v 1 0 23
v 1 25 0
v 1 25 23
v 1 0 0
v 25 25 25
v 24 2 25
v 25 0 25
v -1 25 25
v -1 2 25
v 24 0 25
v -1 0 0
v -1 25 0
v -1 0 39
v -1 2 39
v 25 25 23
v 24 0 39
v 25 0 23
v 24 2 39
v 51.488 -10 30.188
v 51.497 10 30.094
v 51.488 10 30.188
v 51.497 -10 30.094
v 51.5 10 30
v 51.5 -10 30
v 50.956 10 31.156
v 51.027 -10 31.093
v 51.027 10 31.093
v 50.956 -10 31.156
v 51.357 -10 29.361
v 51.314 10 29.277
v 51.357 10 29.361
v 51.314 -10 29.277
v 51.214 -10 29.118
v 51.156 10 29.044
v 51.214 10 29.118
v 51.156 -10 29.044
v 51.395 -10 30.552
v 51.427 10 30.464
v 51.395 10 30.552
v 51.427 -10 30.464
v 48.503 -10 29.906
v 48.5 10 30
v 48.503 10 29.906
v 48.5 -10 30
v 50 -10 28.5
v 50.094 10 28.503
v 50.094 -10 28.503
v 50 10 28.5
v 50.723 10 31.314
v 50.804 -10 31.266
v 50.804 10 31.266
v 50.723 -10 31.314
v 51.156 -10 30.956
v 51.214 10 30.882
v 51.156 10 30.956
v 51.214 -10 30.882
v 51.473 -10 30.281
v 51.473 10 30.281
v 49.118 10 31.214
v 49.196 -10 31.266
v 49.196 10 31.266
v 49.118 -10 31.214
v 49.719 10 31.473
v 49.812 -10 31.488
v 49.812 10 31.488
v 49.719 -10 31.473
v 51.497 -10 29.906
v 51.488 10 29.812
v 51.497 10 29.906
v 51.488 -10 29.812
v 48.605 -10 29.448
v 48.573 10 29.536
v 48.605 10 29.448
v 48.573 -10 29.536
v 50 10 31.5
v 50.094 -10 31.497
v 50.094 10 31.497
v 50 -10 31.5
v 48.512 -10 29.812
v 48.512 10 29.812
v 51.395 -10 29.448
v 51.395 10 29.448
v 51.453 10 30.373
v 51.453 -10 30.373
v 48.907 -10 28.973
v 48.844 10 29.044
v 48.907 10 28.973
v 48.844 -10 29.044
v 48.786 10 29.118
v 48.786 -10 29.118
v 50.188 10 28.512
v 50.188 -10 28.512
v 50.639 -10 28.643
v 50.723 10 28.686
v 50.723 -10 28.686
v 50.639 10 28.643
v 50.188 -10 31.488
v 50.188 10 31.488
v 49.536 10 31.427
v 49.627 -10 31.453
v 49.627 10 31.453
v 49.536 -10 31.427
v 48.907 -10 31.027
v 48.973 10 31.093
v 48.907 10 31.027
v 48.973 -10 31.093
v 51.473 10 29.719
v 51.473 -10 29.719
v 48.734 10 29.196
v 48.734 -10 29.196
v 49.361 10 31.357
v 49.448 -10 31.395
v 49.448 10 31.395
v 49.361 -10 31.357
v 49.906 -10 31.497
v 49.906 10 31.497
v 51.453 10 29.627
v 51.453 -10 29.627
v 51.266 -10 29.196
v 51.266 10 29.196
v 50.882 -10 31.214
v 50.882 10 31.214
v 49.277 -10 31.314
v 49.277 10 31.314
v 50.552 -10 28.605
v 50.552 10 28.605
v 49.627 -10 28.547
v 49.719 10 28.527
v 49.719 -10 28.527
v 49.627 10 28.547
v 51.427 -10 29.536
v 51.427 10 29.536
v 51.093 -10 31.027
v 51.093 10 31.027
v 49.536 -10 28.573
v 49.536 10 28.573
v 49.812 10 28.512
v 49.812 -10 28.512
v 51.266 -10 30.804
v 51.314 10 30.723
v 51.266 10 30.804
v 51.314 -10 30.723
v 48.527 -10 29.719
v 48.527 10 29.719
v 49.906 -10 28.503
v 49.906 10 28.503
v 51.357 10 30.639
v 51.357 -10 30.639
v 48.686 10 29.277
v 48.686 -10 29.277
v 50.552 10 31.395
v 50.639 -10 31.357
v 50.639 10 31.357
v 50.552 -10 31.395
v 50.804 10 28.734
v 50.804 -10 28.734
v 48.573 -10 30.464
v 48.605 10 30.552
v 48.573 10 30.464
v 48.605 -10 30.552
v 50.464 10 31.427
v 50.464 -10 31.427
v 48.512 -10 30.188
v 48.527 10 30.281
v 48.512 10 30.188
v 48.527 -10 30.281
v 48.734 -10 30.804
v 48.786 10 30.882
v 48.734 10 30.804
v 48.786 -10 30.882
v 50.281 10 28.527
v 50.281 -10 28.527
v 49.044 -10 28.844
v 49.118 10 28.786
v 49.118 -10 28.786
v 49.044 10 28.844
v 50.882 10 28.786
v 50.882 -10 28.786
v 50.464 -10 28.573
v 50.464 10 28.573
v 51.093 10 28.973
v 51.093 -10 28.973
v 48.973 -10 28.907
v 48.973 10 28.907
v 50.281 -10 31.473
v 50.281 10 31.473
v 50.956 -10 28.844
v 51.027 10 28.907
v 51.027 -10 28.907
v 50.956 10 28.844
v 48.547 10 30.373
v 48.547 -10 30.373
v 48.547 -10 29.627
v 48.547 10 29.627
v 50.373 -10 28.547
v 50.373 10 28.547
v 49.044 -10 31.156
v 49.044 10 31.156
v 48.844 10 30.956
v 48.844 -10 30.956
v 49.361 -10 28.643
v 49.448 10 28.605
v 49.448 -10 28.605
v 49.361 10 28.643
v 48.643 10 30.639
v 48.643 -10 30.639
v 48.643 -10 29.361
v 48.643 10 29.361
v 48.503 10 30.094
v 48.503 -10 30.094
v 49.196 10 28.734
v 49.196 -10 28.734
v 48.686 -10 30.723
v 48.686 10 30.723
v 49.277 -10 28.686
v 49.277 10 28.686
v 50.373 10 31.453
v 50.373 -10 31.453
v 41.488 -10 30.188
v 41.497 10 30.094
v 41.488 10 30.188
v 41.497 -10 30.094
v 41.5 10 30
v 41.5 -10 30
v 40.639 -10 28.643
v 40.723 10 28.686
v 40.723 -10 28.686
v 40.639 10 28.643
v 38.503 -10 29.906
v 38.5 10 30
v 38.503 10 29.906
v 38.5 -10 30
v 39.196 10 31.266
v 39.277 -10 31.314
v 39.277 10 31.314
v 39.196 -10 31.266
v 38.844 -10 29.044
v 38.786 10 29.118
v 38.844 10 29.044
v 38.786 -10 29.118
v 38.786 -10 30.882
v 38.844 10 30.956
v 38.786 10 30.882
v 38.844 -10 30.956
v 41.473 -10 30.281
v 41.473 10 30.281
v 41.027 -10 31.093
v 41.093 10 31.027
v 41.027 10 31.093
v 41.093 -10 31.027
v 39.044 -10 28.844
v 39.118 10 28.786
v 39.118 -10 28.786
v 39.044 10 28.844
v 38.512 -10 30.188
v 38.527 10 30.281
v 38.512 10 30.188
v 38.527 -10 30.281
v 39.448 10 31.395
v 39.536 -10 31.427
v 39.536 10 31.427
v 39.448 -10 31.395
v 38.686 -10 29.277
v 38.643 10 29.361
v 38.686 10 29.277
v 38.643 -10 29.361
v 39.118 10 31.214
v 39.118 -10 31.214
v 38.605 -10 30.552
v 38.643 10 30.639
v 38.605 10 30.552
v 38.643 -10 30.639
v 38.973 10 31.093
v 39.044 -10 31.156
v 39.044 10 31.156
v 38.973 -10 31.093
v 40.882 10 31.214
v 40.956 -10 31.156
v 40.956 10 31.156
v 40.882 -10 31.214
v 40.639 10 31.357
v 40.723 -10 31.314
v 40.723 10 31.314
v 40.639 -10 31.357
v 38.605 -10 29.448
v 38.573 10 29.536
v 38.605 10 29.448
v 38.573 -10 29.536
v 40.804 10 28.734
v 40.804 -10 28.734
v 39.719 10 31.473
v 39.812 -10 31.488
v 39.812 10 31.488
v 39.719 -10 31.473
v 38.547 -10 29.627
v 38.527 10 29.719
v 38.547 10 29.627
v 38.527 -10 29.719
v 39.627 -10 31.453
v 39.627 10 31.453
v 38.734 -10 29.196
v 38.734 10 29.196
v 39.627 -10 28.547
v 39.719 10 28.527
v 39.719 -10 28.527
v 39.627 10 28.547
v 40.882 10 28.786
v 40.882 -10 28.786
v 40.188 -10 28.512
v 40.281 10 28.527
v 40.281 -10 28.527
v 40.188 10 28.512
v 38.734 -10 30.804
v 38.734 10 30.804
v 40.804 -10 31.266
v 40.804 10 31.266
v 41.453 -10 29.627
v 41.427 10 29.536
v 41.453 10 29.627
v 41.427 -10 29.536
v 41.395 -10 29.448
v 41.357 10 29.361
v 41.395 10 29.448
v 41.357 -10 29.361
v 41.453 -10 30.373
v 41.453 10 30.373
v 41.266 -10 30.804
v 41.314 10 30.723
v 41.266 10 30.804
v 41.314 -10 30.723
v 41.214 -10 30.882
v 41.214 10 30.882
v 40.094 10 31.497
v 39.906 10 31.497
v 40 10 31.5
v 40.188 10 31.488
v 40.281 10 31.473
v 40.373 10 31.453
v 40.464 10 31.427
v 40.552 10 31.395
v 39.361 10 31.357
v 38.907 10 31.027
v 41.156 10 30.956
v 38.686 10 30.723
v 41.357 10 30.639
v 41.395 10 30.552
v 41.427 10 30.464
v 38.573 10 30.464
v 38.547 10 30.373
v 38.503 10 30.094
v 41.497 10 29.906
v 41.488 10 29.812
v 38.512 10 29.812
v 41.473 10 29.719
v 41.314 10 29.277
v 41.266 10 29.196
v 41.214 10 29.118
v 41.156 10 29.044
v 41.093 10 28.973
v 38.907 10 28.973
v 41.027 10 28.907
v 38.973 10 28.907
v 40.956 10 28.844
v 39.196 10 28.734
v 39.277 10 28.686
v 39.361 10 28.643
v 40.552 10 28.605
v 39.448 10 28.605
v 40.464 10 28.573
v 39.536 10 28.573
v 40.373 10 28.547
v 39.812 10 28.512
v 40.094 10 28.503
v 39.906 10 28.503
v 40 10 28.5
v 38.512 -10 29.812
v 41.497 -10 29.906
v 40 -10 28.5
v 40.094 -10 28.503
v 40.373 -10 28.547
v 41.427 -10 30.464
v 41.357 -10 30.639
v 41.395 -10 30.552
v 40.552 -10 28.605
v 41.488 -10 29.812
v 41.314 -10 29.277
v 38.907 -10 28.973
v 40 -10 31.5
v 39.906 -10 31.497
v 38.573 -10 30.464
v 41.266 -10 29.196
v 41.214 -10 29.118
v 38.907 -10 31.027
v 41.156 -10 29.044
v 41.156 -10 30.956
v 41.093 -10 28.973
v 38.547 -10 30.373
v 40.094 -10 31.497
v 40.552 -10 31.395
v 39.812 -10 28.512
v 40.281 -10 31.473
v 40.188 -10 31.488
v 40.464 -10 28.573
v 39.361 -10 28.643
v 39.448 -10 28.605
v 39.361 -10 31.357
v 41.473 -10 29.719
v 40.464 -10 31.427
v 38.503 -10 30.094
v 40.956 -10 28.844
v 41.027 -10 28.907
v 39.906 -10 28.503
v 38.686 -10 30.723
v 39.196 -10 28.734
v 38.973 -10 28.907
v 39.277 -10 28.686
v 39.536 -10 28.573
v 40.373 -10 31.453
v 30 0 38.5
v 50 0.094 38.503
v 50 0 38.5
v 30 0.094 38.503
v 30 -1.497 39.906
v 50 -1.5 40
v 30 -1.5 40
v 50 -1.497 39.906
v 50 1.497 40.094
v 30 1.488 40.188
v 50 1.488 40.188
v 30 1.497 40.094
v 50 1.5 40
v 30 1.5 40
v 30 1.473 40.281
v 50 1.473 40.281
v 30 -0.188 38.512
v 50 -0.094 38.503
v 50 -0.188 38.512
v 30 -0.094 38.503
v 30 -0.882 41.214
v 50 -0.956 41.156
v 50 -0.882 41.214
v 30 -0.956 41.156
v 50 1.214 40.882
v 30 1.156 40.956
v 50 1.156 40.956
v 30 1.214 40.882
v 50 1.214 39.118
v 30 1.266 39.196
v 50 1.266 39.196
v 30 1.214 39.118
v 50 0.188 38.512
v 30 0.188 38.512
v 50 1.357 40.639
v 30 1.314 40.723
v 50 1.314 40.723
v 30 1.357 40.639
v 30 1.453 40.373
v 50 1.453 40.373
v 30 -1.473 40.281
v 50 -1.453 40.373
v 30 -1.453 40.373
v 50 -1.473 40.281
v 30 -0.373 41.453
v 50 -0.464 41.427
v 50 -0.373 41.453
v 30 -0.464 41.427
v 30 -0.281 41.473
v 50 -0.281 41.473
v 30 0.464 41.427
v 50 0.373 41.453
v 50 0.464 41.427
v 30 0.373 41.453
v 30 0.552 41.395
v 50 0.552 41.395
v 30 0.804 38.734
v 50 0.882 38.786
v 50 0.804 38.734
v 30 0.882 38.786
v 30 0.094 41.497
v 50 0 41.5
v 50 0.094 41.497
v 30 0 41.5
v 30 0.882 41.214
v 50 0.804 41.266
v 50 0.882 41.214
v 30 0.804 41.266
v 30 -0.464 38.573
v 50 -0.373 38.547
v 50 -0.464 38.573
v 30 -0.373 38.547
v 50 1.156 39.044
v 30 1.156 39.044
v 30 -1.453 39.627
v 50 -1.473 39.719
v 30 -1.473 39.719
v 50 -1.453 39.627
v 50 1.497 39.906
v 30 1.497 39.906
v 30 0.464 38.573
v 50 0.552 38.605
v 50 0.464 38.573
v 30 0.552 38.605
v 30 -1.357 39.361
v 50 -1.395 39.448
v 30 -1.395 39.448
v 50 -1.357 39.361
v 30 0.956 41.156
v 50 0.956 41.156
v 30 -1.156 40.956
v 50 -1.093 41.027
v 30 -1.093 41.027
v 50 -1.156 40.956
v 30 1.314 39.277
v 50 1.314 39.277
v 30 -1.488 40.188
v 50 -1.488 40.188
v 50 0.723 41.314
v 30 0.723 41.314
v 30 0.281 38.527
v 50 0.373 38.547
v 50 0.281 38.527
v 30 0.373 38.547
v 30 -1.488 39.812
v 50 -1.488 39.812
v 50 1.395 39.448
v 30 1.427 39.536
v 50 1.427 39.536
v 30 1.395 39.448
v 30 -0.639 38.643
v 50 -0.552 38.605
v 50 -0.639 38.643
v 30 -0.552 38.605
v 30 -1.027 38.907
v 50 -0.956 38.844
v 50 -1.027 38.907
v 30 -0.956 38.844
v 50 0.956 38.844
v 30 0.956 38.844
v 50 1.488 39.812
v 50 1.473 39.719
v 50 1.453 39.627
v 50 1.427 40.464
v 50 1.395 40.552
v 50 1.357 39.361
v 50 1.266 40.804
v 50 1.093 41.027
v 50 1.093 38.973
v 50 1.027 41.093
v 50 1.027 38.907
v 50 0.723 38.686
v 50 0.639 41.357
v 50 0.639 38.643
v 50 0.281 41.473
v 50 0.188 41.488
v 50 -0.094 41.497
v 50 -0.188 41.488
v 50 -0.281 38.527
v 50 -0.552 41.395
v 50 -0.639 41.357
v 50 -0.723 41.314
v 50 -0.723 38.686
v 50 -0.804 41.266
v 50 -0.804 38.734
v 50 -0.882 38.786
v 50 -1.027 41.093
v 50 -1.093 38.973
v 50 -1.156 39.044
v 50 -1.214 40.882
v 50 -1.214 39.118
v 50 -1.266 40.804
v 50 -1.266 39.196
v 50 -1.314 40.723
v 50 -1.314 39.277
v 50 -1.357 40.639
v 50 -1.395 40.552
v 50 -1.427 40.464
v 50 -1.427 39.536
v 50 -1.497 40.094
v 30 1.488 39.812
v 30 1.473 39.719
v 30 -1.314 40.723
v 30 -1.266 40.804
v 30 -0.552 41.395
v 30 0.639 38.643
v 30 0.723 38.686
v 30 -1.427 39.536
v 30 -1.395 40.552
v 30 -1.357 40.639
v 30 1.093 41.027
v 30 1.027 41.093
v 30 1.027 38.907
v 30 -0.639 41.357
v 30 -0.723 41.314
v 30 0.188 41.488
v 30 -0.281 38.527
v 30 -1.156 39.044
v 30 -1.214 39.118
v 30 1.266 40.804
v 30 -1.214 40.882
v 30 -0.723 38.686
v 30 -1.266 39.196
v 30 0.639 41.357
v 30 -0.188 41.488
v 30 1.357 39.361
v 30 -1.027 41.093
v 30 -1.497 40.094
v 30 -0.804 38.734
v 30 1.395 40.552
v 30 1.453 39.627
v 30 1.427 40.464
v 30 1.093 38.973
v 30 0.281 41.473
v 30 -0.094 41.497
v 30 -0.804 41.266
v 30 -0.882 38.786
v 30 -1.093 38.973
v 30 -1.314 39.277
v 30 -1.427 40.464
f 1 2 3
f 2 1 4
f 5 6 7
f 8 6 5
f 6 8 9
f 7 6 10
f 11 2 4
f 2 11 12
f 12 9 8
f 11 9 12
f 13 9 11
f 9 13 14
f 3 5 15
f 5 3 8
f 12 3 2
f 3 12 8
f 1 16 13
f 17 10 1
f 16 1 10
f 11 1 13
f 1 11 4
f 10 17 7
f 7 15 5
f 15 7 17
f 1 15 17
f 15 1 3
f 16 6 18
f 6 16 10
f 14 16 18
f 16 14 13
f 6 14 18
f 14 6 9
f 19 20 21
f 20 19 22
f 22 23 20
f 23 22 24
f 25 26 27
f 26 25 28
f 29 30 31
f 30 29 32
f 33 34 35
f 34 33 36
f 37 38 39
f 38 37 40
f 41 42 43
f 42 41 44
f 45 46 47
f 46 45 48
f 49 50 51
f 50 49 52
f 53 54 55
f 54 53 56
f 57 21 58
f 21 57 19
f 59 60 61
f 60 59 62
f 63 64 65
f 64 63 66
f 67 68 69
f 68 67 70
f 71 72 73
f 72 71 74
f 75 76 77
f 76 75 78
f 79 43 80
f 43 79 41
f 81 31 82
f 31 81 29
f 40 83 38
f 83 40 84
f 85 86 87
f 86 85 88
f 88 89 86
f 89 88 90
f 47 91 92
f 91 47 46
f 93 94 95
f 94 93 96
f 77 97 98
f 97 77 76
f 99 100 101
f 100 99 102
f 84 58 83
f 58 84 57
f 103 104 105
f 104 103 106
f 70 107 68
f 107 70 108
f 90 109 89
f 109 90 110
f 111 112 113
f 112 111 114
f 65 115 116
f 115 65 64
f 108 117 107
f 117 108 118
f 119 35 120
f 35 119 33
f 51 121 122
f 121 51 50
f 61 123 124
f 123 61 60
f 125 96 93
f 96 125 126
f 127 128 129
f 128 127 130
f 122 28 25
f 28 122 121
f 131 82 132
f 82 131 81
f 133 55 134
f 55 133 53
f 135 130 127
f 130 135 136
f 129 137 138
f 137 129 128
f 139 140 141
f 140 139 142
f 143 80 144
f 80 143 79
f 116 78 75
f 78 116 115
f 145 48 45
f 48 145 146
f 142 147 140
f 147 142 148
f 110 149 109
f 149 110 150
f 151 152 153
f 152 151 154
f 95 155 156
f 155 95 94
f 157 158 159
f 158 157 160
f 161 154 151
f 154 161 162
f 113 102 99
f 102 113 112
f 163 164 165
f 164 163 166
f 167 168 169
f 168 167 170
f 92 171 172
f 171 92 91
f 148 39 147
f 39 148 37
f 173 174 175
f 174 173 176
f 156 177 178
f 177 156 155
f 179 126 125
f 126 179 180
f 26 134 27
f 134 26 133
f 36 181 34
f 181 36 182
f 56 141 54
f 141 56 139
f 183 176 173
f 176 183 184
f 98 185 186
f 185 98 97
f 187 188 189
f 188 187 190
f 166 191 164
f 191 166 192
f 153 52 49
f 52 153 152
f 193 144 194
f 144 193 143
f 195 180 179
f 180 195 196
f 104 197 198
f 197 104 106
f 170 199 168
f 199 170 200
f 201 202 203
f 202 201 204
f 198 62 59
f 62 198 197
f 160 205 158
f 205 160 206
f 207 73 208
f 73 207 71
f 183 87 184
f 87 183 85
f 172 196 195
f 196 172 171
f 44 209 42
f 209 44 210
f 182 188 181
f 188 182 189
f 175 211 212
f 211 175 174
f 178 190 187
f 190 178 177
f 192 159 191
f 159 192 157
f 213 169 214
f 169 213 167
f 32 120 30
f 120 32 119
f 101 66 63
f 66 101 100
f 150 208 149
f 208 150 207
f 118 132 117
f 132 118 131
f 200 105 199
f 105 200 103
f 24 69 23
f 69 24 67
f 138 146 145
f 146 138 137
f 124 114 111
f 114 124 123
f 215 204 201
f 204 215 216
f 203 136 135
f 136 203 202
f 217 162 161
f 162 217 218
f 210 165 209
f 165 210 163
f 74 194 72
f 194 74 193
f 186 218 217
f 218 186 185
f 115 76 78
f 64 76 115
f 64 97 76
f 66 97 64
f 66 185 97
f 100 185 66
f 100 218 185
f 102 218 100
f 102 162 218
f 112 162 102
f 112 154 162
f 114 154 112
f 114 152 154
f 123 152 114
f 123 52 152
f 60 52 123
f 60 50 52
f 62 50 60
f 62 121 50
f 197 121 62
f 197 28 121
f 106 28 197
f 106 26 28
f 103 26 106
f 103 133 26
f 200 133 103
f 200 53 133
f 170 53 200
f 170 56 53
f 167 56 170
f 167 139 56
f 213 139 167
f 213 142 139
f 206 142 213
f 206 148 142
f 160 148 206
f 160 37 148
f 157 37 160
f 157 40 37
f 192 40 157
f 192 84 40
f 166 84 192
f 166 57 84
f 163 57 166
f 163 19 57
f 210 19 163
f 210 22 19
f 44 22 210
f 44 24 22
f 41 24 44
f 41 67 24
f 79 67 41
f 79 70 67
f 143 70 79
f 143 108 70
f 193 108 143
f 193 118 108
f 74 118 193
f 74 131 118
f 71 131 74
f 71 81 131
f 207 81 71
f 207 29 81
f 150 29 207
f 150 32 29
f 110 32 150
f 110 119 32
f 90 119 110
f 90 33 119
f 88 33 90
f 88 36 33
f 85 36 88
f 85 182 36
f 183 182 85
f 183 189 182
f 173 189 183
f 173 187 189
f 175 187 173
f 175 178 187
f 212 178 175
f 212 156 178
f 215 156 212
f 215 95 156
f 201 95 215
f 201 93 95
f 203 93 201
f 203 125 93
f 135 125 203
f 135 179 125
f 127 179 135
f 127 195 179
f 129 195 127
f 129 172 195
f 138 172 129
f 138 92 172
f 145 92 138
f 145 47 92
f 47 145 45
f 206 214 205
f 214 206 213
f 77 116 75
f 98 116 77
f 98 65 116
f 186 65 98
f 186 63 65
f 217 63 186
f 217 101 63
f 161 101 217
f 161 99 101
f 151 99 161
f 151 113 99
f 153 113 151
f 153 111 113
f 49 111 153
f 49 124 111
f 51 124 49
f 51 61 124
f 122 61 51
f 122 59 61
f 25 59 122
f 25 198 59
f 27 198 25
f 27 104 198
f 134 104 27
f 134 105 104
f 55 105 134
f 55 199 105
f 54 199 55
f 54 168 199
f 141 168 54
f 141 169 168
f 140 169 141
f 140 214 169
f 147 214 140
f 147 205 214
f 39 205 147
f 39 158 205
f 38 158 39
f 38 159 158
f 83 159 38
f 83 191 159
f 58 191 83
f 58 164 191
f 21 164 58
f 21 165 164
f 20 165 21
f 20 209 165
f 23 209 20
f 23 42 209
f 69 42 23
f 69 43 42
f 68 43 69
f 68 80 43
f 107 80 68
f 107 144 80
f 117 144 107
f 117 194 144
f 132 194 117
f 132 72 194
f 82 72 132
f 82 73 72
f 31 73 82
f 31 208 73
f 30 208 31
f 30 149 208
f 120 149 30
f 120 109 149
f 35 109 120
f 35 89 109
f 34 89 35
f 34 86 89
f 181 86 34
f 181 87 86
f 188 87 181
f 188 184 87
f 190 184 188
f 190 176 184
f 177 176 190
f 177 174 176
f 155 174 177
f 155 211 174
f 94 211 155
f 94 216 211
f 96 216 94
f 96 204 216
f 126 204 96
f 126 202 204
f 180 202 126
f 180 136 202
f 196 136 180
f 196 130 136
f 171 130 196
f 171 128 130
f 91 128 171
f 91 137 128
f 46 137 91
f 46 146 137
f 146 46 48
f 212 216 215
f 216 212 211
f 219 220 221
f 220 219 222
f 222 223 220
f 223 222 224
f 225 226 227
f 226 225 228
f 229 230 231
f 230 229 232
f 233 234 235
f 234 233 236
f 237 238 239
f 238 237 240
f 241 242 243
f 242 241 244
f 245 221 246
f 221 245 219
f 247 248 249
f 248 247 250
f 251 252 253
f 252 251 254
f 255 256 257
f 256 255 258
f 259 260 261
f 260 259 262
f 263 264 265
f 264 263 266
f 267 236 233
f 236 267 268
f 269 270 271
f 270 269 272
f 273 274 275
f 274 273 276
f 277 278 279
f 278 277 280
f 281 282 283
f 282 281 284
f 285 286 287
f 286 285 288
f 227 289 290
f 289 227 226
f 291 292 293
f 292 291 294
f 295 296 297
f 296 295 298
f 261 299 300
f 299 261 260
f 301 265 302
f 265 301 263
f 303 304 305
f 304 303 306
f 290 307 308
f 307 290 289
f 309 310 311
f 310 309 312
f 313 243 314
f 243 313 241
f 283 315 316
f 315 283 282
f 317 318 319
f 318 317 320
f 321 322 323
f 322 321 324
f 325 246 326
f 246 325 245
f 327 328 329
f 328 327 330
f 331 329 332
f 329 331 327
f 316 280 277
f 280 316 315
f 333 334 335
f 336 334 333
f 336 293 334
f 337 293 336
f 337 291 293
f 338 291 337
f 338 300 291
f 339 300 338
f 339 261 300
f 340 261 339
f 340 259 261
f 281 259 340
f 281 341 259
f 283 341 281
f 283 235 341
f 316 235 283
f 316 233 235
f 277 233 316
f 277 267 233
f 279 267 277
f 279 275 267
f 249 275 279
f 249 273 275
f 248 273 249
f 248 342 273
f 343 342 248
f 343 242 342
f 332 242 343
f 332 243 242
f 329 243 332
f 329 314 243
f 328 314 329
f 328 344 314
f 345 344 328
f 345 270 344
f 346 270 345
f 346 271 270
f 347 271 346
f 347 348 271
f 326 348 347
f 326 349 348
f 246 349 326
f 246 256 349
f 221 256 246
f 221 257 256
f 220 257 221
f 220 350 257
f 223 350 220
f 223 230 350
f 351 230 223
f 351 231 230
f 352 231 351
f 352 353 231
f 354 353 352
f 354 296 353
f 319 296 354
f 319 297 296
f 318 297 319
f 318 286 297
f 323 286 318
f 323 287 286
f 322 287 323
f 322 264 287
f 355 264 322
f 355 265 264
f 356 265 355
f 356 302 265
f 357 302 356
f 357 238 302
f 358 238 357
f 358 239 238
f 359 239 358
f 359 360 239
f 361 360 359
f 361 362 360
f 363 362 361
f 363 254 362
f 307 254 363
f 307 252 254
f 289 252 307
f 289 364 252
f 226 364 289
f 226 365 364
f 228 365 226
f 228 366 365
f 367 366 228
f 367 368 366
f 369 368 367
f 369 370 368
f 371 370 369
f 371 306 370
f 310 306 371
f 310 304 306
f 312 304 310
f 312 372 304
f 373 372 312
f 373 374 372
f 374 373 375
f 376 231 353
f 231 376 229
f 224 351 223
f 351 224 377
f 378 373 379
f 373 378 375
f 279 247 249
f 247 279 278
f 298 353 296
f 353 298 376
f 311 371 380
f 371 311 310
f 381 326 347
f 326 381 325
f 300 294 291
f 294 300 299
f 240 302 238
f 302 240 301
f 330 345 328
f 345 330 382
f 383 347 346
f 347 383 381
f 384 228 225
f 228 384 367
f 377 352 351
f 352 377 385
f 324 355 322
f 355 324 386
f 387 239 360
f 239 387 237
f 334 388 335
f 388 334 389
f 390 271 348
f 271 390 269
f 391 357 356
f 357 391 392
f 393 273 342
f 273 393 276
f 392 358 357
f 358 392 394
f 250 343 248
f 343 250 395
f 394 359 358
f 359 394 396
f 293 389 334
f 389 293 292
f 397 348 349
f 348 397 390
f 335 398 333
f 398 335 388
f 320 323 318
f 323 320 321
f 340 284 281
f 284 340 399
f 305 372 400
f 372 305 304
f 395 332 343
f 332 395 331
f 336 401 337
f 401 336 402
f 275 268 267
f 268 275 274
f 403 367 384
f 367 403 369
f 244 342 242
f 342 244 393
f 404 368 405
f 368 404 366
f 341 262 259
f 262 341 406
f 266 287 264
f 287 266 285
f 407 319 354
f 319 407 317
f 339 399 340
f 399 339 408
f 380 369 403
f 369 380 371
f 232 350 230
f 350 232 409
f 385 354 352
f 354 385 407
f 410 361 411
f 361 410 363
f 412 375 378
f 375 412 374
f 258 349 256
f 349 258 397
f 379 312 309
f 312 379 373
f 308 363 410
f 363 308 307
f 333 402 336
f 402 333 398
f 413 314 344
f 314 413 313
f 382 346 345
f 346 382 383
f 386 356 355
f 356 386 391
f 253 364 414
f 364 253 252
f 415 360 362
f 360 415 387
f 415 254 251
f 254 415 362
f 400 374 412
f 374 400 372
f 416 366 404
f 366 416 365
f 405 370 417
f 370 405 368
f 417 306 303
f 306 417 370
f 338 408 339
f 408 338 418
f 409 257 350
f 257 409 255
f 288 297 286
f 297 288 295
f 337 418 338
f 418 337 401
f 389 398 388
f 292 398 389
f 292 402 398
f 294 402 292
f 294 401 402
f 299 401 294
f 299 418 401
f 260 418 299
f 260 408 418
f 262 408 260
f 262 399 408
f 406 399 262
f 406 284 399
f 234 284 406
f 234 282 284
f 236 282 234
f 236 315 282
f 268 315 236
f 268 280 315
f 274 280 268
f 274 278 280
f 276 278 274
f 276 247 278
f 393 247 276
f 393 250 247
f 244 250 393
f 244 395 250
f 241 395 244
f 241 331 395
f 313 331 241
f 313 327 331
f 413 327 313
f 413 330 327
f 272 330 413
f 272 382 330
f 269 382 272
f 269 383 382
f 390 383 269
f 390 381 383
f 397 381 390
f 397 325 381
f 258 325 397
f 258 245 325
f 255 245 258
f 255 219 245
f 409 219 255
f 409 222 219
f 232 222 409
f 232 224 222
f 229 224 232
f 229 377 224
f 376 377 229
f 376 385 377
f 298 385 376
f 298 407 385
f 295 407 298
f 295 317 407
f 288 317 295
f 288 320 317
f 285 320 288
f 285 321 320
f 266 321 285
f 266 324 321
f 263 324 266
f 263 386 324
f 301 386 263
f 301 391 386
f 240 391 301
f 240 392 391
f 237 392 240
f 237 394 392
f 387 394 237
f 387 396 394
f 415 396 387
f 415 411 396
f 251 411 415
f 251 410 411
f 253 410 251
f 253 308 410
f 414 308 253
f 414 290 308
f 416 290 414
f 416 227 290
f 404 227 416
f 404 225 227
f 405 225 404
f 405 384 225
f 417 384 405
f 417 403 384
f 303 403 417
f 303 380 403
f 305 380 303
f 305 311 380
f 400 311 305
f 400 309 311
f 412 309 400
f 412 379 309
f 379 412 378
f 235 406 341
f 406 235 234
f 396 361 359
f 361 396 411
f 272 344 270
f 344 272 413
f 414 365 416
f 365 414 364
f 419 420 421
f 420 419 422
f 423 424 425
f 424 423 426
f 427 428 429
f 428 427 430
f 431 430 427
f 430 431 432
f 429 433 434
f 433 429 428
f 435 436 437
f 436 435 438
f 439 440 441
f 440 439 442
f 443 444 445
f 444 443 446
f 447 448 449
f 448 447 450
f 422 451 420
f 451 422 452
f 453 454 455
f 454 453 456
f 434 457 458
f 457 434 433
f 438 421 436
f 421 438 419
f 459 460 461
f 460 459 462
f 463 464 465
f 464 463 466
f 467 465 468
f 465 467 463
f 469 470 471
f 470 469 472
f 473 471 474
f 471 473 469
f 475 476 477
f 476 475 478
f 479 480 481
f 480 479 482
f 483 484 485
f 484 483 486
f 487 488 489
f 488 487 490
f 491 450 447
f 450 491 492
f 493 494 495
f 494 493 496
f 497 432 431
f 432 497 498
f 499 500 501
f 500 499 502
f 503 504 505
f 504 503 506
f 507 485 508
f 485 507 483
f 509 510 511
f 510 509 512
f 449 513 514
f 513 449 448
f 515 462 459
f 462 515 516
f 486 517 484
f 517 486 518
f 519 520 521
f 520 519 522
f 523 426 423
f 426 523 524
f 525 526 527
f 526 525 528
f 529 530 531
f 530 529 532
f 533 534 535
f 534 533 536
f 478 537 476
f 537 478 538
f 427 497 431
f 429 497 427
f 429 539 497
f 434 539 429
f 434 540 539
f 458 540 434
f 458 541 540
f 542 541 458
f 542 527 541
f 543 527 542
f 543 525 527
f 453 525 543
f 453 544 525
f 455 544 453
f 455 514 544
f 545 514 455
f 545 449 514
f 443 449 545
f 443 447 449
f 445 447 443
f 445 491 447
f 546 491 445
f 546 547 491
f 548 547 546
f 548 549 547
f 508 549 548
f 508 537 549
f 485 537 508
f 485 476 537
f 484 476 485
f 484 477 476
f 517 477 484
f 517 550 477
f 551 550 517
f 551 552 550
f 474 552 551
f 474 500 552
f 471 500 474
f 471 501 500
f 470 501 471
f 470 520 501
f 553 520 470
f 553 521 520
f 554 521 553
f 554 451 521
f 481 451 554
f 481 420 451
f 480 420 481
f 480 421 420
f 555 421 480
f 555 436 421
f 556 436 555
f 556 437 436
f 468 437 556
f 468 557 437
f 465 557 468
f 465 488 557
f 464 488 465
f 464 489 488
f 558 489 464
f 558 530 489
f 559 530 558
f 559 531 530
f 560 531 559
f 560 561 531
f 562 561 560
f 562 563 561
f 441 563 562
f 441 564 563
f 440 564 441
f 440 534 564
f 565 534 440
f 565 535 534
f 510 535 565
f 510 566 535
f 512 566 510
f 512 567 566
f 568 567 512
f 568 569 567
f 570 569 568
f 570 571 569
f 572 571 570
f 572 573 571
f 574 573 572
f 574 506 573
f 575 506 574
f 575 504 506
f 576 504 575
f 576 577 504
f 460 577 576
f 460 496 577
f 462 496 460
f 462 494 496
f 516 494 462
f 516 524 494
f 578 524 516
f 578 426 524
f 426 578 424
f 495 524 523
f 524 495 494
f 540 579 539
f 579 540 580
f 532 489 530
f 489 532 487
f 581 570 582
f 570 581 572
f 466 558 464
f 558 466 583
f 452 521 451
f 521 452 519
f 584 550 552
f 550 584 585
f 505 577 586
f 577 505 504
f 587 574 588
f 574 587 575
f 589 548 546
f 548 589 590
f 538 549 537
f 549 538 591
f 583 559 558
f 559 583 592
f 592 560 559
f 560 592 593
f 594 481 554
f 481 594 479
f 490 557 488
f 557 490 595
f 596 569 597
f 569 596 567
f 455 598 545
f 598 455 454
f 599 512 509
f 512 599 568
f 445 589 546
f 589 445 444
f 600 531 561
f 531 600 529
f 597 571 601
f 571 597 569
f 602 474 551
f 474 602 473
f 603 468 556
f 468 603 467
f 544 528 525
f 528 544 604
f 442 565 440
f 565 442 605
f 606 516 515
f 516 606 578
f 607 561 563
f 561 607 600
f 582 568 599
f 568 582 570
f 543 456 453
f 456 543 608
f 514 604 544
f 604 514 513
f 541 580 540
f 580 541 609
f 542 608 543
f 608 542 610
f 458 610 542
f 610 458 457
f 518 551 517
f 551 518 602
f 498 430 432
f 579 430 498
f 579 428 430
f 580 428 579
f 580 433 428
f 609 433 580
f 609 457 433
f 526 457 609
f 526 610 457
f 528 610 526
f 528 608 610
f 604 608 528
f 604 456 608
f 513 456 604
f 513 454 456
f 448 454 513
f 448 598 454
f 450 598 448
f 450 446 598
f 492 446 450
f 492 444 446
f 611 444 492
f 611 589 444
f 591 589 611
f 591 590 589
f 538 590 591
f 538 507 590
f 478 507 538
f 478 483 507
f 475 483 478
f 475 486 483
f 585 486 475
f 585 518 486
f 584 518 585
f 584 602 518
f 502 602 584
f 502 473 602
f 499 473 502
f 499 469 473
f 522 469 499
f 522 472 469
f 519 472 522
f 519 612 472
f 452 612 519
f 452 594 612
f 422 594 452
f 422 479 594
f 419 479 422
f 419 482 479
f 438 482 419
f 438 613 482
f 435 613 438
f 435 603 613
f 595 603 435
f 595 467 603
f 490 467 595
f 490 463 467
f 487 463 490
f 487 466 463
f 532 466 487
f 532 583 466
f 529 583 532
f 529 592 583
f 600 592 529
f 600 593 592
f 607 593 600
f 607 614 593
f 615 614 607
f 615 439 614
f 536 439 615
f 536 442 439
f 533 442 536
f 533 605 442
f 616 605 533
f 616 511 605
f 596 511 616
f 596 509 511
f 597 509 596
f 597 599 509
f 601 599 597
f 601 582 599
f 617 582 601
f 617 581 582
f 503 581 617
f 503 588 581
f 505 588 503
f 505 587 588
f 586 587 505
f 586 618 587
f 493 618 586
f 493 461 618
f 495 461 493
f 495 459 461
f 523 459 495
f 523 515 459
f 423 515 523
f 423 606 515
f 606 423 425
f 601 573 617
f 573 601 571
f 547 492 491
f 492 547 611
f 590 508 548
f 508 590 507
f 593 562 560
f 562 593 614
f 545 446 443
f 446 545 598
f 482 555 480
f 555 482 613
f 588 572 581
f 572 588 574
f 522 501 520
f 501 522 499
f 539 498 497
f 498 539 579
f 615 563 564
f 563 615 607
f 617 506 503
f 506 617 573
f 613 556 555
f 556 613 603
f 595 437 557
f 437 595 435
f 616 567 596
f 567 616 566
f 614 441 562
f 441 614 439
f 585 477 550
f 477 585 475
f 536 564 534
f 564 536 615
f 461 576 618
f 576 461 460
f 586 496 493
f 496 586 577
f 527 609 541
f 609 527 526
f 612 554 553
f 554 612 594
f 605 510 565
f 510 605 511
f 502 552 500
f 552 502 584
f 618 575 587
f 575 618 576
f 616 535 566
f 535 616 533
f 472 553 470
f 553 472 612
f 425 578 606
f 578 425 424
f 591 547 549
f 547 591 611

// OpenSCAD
union () {
  // 
  translate([-1,0,0])
  cube([2,25,25]);
    
  // side shelf
  translate([0,0,23])
  cube([25,25,2]);
      
  // top slab
  translate([-1,0,24])
  cube([25,2,15]);
}


module m3Rod() {
  $fn = 100;    
  cylinder(h=20, r=1.5);  
}


translate([50, 0, 30])
union() {
  translate([0,10,0])
  rotate([90,0,0])
  m3Rod();

  translate([-10,10,0])
  rotate([90,0,0])
  m3Rod();

  translate([-20,0,10])
  rotate([90,0,90])    
  m3Rod();
}
